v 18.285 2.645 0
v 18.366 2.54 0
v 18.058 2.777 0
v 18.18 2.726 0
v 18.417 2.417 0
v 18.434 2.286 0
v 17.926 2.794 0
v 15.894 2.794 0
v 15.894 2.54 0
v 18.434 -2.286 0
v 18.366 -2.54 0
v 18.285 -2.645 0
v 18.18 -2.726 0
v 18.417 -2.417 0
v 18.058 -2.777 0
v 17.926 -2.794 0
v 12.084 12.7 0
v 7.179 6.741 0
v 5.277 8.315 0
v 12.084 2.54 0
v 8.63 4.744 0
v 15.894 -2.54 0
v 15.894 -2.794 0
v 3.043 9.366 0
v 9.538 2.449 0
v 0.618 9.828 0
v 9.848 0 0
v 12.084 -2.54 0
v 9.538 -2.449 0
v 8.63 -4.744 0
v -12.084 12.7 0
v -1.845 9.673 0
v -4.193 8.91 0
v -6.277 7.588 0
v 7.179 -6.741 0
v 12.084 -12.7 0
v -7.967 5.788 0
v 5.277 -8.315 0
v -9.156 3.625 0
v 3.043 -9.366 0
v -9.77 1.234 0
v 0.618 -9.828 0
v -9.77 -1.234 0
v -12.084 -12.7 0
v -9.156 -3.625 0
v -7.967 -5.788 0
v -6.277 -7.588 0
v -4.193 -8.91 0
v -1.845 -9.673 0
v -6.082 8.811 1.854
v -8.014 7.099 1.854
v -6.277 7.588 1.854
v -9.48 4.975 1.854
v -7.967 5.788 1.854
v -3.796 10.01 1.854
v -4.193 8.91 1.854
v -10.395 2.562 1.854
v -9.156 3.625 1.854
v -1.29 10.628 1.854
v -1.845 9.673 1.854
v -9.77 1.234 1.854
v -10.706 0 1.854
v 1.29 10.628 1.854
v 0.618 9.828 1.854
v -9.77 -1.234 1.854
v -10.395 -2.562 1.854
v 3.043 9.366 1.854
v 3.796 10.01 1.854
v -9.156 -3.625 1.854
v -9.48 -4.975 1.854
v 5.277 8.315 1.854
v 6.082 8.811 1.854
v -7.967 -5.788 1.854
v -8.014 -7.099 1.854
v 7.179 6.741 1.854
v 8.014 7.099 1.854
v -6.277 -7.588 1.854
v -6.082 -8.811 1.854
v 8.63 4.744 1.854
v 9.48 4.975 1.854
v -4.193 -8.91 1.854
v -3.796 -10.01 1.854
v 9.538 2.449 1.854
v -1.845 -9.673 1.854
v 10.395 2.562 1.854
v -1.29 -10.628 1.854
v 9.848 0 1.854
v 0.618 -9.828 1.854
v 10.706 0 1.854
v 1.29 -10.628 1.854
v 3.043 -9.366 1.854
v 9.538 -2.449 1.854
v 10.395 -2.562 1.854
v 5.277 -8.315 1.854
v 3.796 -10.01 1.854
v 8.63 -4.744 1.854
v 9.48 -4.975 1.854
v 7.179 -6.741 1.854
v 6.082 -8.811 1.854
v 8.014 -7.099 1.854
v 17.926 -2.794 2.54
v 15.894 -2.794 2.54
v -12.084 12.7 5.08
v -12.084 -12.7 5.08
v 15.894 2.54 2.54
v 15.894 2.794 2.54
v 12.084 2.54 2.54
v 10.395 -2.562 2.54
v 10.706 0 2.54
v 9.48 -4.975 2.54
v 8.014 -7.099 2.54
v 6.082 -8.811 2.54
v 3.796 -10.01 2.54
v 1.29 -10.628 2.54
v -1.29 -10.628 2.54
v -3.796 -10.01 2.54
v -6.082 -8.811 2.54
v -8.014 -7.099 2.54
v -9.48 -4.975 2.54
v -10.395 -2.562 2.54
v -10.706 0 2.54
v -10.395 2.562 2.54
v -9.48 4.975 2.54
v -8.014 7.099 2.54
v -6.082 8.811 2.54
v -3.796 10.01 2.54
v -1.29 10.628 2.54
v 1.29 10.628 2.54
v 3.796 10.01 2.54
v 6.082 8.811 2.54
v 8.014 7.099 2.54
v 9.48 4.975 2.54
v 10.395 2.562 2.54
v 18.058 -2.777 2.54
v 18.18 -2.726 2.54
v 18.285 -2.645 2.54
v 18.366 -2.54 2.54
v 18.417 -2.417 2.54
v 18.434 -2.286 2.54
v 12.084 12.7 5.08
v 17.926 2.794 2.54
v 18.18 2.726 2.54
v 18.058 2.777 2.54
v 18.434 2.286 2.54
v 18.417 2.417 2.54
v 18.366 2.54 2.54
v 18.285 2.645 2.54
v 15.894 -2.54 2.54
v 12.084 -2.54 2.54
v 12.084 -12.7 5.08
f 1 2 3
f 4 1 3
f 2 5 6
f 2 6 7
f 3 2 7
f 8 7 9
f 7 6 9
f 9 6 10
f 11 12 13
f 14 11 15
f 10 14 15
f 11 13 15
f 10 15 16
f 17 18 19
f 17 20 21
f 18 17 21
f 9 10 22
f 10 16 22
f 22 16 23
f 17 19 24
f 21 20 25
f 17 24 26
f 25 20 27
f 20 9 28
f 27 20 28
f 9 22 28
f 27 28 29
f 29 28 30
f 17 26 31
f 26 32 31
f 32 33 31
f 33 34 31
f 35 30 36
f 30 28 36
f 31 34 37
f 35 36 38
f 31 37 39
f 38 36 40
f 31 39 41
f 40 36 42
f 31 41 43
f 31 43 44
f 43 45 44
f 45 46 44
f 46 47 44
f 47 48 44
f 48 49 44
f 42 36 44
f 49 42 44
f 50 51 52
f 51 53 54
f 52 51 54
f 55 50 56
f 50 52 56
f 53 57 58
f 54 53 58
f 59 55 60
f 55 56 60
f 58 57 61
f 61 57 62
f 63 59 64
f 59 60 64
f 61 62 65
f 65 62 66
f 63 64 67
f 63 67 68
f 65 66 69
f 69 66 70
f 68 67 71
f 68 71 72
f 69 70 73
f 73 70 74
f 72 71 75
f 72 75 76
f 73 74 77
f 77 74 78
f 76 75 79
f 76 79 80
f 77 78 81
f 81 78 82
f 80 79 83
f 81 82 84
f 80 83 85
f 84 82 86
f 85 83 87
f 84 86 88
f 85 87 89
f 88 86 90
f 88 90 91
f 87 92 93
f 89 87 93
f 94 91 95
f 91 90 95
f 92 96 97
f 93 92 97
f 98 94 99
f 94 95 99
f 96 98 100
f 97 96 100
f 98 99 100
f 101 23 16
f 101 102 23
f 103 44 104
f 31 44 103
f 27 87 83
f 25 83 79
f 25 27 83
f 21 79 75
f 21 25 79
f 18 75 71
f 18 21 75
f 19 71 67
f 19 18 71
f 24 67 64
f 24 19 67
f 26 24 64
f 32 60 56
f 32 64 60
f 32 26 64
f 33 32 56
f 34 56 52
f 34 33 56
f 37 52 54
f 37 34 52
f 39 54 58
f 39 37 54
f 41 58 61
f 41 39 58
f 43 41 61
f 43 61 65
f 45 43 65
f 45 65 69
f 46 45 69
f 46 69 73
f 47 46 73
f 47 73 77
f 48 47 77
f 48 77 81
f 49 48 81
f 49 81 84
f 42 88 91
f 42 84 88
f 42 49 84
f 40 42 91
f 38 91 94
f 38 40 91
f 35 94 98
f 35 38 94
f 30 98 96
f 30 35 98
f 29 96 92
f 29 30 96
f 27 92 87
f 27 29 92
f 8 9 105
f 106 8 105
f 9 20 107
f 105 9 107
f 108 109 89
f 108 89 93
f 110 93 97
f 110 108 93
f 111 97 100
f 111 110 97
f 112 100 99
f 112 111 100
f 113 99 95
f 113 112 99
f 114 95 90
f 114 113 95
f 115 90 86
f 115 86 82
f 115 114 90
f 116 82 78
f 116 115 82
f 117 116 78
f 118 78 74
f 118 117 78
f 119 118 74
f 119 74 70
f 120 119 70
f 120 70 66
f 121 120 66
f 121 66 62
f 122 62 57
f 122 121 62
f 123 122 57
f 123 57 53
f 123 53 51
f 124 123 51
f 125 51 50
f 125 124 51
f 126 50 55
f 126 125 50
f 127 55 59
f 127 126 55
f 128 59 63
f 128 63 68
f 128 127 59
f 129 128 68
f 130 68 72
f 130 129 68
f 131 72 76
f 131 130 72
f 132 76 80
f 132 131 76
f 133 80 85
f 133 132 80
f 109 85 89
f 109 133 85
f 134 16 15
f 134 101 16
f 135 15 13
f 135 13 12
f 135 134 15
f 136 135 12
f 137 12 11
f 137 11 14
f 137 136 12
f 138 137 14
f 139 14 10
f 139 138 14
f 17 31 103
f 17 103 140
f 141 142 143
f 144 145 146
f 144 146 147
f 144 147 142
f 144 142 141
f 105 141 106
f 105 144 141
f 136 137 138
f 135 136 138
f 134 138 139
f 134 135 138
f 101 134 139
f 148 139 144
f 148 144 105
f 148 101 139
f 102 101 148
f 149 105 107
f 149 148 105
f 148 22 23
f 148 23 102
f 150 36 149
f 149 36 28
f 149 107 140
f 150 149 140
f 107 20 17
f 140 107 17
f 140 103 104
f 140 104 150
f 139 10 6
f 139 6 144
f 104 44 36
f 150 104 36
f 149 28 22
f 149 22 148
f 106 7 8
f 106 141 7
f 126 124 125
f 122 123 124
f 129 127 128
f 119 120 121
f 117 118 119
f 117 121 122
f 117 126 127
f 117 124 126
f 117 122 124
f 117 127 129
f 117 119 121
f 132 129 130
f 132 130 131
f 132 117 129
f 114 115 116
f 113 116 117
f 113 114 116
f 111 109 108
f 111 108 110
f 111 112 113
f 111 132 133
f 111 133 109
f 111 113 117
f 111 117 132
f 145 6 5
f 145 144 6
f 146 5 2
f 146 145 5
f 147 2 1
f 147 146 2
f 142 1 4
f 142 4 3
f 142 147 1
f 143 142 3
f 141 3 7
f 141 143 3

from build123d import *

# Parameters (mm, degrees)
F0_W      = 24.1681
F0_H      = 25.4
F1_DEPTH  = 5.08
F2_R      = 9.84758
F3_DEPTH  = 2.54
F4_R      = 10.706062
F4_R_2    = 9.84758
F5_DEPTH  = 0.6858
F6_W      = 5.08
F6_H      = 2.54
F7_DEPTH  = 6.35
F8_W      = 2.54
F8_H      = 2.54
F9_DEPTH  = 0.254
F10_R     = 0.508
F11_W     = 2.54
F11_H     = 2.54
F12_DEPTH = 0.254
F13_R     = 0.508


with BuildPart() as f1:
    # F0 (on Top) → F1 (new body)
    with BuildSketch(Plane.XY):
        Rectangle(F0_W, F0_H)
    extrude(amount=F1_DEPTH)

    # F2 (on Top) → F3 (cut)
    with BuildSketch(Plane.XY):
        Circle(F2_R)
    extrude(amount=F3_DEPTH, mode=Mode.SUBTRACT)

    # F4 (on face) → F5 (cut)
    with BuildSketch(Plane(origin=(0, 0, 2.54), x_dir=(1, 0, 0), z_dir=(0, 0, -1))):
        Circle(F4_R)
        Circle(F4_R_2, mode=Mode.SUBTRACT)
    extrude(amount=F5_DEPTH, mode=Mode.SUBTRACT)

    # F6 (on face) → F7 (join)
    with BuildSketch(Plane.YZ.offset(12.08405)):
        with Locations((0, 1.27)):
            Rectangle(F6_W, F6_H)
    extrude(amount=F7_DEPTH)

    # F8 (on face) → F9 (join)
    with BuildSketch(Plane.XZ.offset(2.54)):
        with Locations((17.16405, 1.27)):
            Rectangle(F8_W, F8_H)
    extrude(amount=F9_DEPTH)

    # F10
    f10_edges = [f1.edges().sort_by_distance(p)[0] for p in [
        (18.43405, -2.794, 1.27),
    ]]
    fillet(f10_edges, radius=F10_R)

    # F11 (on face) → F12 (join)
    with BuildSketch(Plane(origin=(0, 2.54, 0), x_dir=(-1, 0, 0), z_dir=(0, 1, 0))):
        with Locations((-17.16405, 1.27)):
            Rectangle(F11_W, F11_H)
    extrude(amount=F12_DEPTH)

    # F13
    f13_edges = [f1.edges().sort_by_distance(p)[0] for p in [
        (18.43405, 2.794, 1.27),
    ]]
    fillet(f13_edges, radius=F13_R)


solid = f1.part
